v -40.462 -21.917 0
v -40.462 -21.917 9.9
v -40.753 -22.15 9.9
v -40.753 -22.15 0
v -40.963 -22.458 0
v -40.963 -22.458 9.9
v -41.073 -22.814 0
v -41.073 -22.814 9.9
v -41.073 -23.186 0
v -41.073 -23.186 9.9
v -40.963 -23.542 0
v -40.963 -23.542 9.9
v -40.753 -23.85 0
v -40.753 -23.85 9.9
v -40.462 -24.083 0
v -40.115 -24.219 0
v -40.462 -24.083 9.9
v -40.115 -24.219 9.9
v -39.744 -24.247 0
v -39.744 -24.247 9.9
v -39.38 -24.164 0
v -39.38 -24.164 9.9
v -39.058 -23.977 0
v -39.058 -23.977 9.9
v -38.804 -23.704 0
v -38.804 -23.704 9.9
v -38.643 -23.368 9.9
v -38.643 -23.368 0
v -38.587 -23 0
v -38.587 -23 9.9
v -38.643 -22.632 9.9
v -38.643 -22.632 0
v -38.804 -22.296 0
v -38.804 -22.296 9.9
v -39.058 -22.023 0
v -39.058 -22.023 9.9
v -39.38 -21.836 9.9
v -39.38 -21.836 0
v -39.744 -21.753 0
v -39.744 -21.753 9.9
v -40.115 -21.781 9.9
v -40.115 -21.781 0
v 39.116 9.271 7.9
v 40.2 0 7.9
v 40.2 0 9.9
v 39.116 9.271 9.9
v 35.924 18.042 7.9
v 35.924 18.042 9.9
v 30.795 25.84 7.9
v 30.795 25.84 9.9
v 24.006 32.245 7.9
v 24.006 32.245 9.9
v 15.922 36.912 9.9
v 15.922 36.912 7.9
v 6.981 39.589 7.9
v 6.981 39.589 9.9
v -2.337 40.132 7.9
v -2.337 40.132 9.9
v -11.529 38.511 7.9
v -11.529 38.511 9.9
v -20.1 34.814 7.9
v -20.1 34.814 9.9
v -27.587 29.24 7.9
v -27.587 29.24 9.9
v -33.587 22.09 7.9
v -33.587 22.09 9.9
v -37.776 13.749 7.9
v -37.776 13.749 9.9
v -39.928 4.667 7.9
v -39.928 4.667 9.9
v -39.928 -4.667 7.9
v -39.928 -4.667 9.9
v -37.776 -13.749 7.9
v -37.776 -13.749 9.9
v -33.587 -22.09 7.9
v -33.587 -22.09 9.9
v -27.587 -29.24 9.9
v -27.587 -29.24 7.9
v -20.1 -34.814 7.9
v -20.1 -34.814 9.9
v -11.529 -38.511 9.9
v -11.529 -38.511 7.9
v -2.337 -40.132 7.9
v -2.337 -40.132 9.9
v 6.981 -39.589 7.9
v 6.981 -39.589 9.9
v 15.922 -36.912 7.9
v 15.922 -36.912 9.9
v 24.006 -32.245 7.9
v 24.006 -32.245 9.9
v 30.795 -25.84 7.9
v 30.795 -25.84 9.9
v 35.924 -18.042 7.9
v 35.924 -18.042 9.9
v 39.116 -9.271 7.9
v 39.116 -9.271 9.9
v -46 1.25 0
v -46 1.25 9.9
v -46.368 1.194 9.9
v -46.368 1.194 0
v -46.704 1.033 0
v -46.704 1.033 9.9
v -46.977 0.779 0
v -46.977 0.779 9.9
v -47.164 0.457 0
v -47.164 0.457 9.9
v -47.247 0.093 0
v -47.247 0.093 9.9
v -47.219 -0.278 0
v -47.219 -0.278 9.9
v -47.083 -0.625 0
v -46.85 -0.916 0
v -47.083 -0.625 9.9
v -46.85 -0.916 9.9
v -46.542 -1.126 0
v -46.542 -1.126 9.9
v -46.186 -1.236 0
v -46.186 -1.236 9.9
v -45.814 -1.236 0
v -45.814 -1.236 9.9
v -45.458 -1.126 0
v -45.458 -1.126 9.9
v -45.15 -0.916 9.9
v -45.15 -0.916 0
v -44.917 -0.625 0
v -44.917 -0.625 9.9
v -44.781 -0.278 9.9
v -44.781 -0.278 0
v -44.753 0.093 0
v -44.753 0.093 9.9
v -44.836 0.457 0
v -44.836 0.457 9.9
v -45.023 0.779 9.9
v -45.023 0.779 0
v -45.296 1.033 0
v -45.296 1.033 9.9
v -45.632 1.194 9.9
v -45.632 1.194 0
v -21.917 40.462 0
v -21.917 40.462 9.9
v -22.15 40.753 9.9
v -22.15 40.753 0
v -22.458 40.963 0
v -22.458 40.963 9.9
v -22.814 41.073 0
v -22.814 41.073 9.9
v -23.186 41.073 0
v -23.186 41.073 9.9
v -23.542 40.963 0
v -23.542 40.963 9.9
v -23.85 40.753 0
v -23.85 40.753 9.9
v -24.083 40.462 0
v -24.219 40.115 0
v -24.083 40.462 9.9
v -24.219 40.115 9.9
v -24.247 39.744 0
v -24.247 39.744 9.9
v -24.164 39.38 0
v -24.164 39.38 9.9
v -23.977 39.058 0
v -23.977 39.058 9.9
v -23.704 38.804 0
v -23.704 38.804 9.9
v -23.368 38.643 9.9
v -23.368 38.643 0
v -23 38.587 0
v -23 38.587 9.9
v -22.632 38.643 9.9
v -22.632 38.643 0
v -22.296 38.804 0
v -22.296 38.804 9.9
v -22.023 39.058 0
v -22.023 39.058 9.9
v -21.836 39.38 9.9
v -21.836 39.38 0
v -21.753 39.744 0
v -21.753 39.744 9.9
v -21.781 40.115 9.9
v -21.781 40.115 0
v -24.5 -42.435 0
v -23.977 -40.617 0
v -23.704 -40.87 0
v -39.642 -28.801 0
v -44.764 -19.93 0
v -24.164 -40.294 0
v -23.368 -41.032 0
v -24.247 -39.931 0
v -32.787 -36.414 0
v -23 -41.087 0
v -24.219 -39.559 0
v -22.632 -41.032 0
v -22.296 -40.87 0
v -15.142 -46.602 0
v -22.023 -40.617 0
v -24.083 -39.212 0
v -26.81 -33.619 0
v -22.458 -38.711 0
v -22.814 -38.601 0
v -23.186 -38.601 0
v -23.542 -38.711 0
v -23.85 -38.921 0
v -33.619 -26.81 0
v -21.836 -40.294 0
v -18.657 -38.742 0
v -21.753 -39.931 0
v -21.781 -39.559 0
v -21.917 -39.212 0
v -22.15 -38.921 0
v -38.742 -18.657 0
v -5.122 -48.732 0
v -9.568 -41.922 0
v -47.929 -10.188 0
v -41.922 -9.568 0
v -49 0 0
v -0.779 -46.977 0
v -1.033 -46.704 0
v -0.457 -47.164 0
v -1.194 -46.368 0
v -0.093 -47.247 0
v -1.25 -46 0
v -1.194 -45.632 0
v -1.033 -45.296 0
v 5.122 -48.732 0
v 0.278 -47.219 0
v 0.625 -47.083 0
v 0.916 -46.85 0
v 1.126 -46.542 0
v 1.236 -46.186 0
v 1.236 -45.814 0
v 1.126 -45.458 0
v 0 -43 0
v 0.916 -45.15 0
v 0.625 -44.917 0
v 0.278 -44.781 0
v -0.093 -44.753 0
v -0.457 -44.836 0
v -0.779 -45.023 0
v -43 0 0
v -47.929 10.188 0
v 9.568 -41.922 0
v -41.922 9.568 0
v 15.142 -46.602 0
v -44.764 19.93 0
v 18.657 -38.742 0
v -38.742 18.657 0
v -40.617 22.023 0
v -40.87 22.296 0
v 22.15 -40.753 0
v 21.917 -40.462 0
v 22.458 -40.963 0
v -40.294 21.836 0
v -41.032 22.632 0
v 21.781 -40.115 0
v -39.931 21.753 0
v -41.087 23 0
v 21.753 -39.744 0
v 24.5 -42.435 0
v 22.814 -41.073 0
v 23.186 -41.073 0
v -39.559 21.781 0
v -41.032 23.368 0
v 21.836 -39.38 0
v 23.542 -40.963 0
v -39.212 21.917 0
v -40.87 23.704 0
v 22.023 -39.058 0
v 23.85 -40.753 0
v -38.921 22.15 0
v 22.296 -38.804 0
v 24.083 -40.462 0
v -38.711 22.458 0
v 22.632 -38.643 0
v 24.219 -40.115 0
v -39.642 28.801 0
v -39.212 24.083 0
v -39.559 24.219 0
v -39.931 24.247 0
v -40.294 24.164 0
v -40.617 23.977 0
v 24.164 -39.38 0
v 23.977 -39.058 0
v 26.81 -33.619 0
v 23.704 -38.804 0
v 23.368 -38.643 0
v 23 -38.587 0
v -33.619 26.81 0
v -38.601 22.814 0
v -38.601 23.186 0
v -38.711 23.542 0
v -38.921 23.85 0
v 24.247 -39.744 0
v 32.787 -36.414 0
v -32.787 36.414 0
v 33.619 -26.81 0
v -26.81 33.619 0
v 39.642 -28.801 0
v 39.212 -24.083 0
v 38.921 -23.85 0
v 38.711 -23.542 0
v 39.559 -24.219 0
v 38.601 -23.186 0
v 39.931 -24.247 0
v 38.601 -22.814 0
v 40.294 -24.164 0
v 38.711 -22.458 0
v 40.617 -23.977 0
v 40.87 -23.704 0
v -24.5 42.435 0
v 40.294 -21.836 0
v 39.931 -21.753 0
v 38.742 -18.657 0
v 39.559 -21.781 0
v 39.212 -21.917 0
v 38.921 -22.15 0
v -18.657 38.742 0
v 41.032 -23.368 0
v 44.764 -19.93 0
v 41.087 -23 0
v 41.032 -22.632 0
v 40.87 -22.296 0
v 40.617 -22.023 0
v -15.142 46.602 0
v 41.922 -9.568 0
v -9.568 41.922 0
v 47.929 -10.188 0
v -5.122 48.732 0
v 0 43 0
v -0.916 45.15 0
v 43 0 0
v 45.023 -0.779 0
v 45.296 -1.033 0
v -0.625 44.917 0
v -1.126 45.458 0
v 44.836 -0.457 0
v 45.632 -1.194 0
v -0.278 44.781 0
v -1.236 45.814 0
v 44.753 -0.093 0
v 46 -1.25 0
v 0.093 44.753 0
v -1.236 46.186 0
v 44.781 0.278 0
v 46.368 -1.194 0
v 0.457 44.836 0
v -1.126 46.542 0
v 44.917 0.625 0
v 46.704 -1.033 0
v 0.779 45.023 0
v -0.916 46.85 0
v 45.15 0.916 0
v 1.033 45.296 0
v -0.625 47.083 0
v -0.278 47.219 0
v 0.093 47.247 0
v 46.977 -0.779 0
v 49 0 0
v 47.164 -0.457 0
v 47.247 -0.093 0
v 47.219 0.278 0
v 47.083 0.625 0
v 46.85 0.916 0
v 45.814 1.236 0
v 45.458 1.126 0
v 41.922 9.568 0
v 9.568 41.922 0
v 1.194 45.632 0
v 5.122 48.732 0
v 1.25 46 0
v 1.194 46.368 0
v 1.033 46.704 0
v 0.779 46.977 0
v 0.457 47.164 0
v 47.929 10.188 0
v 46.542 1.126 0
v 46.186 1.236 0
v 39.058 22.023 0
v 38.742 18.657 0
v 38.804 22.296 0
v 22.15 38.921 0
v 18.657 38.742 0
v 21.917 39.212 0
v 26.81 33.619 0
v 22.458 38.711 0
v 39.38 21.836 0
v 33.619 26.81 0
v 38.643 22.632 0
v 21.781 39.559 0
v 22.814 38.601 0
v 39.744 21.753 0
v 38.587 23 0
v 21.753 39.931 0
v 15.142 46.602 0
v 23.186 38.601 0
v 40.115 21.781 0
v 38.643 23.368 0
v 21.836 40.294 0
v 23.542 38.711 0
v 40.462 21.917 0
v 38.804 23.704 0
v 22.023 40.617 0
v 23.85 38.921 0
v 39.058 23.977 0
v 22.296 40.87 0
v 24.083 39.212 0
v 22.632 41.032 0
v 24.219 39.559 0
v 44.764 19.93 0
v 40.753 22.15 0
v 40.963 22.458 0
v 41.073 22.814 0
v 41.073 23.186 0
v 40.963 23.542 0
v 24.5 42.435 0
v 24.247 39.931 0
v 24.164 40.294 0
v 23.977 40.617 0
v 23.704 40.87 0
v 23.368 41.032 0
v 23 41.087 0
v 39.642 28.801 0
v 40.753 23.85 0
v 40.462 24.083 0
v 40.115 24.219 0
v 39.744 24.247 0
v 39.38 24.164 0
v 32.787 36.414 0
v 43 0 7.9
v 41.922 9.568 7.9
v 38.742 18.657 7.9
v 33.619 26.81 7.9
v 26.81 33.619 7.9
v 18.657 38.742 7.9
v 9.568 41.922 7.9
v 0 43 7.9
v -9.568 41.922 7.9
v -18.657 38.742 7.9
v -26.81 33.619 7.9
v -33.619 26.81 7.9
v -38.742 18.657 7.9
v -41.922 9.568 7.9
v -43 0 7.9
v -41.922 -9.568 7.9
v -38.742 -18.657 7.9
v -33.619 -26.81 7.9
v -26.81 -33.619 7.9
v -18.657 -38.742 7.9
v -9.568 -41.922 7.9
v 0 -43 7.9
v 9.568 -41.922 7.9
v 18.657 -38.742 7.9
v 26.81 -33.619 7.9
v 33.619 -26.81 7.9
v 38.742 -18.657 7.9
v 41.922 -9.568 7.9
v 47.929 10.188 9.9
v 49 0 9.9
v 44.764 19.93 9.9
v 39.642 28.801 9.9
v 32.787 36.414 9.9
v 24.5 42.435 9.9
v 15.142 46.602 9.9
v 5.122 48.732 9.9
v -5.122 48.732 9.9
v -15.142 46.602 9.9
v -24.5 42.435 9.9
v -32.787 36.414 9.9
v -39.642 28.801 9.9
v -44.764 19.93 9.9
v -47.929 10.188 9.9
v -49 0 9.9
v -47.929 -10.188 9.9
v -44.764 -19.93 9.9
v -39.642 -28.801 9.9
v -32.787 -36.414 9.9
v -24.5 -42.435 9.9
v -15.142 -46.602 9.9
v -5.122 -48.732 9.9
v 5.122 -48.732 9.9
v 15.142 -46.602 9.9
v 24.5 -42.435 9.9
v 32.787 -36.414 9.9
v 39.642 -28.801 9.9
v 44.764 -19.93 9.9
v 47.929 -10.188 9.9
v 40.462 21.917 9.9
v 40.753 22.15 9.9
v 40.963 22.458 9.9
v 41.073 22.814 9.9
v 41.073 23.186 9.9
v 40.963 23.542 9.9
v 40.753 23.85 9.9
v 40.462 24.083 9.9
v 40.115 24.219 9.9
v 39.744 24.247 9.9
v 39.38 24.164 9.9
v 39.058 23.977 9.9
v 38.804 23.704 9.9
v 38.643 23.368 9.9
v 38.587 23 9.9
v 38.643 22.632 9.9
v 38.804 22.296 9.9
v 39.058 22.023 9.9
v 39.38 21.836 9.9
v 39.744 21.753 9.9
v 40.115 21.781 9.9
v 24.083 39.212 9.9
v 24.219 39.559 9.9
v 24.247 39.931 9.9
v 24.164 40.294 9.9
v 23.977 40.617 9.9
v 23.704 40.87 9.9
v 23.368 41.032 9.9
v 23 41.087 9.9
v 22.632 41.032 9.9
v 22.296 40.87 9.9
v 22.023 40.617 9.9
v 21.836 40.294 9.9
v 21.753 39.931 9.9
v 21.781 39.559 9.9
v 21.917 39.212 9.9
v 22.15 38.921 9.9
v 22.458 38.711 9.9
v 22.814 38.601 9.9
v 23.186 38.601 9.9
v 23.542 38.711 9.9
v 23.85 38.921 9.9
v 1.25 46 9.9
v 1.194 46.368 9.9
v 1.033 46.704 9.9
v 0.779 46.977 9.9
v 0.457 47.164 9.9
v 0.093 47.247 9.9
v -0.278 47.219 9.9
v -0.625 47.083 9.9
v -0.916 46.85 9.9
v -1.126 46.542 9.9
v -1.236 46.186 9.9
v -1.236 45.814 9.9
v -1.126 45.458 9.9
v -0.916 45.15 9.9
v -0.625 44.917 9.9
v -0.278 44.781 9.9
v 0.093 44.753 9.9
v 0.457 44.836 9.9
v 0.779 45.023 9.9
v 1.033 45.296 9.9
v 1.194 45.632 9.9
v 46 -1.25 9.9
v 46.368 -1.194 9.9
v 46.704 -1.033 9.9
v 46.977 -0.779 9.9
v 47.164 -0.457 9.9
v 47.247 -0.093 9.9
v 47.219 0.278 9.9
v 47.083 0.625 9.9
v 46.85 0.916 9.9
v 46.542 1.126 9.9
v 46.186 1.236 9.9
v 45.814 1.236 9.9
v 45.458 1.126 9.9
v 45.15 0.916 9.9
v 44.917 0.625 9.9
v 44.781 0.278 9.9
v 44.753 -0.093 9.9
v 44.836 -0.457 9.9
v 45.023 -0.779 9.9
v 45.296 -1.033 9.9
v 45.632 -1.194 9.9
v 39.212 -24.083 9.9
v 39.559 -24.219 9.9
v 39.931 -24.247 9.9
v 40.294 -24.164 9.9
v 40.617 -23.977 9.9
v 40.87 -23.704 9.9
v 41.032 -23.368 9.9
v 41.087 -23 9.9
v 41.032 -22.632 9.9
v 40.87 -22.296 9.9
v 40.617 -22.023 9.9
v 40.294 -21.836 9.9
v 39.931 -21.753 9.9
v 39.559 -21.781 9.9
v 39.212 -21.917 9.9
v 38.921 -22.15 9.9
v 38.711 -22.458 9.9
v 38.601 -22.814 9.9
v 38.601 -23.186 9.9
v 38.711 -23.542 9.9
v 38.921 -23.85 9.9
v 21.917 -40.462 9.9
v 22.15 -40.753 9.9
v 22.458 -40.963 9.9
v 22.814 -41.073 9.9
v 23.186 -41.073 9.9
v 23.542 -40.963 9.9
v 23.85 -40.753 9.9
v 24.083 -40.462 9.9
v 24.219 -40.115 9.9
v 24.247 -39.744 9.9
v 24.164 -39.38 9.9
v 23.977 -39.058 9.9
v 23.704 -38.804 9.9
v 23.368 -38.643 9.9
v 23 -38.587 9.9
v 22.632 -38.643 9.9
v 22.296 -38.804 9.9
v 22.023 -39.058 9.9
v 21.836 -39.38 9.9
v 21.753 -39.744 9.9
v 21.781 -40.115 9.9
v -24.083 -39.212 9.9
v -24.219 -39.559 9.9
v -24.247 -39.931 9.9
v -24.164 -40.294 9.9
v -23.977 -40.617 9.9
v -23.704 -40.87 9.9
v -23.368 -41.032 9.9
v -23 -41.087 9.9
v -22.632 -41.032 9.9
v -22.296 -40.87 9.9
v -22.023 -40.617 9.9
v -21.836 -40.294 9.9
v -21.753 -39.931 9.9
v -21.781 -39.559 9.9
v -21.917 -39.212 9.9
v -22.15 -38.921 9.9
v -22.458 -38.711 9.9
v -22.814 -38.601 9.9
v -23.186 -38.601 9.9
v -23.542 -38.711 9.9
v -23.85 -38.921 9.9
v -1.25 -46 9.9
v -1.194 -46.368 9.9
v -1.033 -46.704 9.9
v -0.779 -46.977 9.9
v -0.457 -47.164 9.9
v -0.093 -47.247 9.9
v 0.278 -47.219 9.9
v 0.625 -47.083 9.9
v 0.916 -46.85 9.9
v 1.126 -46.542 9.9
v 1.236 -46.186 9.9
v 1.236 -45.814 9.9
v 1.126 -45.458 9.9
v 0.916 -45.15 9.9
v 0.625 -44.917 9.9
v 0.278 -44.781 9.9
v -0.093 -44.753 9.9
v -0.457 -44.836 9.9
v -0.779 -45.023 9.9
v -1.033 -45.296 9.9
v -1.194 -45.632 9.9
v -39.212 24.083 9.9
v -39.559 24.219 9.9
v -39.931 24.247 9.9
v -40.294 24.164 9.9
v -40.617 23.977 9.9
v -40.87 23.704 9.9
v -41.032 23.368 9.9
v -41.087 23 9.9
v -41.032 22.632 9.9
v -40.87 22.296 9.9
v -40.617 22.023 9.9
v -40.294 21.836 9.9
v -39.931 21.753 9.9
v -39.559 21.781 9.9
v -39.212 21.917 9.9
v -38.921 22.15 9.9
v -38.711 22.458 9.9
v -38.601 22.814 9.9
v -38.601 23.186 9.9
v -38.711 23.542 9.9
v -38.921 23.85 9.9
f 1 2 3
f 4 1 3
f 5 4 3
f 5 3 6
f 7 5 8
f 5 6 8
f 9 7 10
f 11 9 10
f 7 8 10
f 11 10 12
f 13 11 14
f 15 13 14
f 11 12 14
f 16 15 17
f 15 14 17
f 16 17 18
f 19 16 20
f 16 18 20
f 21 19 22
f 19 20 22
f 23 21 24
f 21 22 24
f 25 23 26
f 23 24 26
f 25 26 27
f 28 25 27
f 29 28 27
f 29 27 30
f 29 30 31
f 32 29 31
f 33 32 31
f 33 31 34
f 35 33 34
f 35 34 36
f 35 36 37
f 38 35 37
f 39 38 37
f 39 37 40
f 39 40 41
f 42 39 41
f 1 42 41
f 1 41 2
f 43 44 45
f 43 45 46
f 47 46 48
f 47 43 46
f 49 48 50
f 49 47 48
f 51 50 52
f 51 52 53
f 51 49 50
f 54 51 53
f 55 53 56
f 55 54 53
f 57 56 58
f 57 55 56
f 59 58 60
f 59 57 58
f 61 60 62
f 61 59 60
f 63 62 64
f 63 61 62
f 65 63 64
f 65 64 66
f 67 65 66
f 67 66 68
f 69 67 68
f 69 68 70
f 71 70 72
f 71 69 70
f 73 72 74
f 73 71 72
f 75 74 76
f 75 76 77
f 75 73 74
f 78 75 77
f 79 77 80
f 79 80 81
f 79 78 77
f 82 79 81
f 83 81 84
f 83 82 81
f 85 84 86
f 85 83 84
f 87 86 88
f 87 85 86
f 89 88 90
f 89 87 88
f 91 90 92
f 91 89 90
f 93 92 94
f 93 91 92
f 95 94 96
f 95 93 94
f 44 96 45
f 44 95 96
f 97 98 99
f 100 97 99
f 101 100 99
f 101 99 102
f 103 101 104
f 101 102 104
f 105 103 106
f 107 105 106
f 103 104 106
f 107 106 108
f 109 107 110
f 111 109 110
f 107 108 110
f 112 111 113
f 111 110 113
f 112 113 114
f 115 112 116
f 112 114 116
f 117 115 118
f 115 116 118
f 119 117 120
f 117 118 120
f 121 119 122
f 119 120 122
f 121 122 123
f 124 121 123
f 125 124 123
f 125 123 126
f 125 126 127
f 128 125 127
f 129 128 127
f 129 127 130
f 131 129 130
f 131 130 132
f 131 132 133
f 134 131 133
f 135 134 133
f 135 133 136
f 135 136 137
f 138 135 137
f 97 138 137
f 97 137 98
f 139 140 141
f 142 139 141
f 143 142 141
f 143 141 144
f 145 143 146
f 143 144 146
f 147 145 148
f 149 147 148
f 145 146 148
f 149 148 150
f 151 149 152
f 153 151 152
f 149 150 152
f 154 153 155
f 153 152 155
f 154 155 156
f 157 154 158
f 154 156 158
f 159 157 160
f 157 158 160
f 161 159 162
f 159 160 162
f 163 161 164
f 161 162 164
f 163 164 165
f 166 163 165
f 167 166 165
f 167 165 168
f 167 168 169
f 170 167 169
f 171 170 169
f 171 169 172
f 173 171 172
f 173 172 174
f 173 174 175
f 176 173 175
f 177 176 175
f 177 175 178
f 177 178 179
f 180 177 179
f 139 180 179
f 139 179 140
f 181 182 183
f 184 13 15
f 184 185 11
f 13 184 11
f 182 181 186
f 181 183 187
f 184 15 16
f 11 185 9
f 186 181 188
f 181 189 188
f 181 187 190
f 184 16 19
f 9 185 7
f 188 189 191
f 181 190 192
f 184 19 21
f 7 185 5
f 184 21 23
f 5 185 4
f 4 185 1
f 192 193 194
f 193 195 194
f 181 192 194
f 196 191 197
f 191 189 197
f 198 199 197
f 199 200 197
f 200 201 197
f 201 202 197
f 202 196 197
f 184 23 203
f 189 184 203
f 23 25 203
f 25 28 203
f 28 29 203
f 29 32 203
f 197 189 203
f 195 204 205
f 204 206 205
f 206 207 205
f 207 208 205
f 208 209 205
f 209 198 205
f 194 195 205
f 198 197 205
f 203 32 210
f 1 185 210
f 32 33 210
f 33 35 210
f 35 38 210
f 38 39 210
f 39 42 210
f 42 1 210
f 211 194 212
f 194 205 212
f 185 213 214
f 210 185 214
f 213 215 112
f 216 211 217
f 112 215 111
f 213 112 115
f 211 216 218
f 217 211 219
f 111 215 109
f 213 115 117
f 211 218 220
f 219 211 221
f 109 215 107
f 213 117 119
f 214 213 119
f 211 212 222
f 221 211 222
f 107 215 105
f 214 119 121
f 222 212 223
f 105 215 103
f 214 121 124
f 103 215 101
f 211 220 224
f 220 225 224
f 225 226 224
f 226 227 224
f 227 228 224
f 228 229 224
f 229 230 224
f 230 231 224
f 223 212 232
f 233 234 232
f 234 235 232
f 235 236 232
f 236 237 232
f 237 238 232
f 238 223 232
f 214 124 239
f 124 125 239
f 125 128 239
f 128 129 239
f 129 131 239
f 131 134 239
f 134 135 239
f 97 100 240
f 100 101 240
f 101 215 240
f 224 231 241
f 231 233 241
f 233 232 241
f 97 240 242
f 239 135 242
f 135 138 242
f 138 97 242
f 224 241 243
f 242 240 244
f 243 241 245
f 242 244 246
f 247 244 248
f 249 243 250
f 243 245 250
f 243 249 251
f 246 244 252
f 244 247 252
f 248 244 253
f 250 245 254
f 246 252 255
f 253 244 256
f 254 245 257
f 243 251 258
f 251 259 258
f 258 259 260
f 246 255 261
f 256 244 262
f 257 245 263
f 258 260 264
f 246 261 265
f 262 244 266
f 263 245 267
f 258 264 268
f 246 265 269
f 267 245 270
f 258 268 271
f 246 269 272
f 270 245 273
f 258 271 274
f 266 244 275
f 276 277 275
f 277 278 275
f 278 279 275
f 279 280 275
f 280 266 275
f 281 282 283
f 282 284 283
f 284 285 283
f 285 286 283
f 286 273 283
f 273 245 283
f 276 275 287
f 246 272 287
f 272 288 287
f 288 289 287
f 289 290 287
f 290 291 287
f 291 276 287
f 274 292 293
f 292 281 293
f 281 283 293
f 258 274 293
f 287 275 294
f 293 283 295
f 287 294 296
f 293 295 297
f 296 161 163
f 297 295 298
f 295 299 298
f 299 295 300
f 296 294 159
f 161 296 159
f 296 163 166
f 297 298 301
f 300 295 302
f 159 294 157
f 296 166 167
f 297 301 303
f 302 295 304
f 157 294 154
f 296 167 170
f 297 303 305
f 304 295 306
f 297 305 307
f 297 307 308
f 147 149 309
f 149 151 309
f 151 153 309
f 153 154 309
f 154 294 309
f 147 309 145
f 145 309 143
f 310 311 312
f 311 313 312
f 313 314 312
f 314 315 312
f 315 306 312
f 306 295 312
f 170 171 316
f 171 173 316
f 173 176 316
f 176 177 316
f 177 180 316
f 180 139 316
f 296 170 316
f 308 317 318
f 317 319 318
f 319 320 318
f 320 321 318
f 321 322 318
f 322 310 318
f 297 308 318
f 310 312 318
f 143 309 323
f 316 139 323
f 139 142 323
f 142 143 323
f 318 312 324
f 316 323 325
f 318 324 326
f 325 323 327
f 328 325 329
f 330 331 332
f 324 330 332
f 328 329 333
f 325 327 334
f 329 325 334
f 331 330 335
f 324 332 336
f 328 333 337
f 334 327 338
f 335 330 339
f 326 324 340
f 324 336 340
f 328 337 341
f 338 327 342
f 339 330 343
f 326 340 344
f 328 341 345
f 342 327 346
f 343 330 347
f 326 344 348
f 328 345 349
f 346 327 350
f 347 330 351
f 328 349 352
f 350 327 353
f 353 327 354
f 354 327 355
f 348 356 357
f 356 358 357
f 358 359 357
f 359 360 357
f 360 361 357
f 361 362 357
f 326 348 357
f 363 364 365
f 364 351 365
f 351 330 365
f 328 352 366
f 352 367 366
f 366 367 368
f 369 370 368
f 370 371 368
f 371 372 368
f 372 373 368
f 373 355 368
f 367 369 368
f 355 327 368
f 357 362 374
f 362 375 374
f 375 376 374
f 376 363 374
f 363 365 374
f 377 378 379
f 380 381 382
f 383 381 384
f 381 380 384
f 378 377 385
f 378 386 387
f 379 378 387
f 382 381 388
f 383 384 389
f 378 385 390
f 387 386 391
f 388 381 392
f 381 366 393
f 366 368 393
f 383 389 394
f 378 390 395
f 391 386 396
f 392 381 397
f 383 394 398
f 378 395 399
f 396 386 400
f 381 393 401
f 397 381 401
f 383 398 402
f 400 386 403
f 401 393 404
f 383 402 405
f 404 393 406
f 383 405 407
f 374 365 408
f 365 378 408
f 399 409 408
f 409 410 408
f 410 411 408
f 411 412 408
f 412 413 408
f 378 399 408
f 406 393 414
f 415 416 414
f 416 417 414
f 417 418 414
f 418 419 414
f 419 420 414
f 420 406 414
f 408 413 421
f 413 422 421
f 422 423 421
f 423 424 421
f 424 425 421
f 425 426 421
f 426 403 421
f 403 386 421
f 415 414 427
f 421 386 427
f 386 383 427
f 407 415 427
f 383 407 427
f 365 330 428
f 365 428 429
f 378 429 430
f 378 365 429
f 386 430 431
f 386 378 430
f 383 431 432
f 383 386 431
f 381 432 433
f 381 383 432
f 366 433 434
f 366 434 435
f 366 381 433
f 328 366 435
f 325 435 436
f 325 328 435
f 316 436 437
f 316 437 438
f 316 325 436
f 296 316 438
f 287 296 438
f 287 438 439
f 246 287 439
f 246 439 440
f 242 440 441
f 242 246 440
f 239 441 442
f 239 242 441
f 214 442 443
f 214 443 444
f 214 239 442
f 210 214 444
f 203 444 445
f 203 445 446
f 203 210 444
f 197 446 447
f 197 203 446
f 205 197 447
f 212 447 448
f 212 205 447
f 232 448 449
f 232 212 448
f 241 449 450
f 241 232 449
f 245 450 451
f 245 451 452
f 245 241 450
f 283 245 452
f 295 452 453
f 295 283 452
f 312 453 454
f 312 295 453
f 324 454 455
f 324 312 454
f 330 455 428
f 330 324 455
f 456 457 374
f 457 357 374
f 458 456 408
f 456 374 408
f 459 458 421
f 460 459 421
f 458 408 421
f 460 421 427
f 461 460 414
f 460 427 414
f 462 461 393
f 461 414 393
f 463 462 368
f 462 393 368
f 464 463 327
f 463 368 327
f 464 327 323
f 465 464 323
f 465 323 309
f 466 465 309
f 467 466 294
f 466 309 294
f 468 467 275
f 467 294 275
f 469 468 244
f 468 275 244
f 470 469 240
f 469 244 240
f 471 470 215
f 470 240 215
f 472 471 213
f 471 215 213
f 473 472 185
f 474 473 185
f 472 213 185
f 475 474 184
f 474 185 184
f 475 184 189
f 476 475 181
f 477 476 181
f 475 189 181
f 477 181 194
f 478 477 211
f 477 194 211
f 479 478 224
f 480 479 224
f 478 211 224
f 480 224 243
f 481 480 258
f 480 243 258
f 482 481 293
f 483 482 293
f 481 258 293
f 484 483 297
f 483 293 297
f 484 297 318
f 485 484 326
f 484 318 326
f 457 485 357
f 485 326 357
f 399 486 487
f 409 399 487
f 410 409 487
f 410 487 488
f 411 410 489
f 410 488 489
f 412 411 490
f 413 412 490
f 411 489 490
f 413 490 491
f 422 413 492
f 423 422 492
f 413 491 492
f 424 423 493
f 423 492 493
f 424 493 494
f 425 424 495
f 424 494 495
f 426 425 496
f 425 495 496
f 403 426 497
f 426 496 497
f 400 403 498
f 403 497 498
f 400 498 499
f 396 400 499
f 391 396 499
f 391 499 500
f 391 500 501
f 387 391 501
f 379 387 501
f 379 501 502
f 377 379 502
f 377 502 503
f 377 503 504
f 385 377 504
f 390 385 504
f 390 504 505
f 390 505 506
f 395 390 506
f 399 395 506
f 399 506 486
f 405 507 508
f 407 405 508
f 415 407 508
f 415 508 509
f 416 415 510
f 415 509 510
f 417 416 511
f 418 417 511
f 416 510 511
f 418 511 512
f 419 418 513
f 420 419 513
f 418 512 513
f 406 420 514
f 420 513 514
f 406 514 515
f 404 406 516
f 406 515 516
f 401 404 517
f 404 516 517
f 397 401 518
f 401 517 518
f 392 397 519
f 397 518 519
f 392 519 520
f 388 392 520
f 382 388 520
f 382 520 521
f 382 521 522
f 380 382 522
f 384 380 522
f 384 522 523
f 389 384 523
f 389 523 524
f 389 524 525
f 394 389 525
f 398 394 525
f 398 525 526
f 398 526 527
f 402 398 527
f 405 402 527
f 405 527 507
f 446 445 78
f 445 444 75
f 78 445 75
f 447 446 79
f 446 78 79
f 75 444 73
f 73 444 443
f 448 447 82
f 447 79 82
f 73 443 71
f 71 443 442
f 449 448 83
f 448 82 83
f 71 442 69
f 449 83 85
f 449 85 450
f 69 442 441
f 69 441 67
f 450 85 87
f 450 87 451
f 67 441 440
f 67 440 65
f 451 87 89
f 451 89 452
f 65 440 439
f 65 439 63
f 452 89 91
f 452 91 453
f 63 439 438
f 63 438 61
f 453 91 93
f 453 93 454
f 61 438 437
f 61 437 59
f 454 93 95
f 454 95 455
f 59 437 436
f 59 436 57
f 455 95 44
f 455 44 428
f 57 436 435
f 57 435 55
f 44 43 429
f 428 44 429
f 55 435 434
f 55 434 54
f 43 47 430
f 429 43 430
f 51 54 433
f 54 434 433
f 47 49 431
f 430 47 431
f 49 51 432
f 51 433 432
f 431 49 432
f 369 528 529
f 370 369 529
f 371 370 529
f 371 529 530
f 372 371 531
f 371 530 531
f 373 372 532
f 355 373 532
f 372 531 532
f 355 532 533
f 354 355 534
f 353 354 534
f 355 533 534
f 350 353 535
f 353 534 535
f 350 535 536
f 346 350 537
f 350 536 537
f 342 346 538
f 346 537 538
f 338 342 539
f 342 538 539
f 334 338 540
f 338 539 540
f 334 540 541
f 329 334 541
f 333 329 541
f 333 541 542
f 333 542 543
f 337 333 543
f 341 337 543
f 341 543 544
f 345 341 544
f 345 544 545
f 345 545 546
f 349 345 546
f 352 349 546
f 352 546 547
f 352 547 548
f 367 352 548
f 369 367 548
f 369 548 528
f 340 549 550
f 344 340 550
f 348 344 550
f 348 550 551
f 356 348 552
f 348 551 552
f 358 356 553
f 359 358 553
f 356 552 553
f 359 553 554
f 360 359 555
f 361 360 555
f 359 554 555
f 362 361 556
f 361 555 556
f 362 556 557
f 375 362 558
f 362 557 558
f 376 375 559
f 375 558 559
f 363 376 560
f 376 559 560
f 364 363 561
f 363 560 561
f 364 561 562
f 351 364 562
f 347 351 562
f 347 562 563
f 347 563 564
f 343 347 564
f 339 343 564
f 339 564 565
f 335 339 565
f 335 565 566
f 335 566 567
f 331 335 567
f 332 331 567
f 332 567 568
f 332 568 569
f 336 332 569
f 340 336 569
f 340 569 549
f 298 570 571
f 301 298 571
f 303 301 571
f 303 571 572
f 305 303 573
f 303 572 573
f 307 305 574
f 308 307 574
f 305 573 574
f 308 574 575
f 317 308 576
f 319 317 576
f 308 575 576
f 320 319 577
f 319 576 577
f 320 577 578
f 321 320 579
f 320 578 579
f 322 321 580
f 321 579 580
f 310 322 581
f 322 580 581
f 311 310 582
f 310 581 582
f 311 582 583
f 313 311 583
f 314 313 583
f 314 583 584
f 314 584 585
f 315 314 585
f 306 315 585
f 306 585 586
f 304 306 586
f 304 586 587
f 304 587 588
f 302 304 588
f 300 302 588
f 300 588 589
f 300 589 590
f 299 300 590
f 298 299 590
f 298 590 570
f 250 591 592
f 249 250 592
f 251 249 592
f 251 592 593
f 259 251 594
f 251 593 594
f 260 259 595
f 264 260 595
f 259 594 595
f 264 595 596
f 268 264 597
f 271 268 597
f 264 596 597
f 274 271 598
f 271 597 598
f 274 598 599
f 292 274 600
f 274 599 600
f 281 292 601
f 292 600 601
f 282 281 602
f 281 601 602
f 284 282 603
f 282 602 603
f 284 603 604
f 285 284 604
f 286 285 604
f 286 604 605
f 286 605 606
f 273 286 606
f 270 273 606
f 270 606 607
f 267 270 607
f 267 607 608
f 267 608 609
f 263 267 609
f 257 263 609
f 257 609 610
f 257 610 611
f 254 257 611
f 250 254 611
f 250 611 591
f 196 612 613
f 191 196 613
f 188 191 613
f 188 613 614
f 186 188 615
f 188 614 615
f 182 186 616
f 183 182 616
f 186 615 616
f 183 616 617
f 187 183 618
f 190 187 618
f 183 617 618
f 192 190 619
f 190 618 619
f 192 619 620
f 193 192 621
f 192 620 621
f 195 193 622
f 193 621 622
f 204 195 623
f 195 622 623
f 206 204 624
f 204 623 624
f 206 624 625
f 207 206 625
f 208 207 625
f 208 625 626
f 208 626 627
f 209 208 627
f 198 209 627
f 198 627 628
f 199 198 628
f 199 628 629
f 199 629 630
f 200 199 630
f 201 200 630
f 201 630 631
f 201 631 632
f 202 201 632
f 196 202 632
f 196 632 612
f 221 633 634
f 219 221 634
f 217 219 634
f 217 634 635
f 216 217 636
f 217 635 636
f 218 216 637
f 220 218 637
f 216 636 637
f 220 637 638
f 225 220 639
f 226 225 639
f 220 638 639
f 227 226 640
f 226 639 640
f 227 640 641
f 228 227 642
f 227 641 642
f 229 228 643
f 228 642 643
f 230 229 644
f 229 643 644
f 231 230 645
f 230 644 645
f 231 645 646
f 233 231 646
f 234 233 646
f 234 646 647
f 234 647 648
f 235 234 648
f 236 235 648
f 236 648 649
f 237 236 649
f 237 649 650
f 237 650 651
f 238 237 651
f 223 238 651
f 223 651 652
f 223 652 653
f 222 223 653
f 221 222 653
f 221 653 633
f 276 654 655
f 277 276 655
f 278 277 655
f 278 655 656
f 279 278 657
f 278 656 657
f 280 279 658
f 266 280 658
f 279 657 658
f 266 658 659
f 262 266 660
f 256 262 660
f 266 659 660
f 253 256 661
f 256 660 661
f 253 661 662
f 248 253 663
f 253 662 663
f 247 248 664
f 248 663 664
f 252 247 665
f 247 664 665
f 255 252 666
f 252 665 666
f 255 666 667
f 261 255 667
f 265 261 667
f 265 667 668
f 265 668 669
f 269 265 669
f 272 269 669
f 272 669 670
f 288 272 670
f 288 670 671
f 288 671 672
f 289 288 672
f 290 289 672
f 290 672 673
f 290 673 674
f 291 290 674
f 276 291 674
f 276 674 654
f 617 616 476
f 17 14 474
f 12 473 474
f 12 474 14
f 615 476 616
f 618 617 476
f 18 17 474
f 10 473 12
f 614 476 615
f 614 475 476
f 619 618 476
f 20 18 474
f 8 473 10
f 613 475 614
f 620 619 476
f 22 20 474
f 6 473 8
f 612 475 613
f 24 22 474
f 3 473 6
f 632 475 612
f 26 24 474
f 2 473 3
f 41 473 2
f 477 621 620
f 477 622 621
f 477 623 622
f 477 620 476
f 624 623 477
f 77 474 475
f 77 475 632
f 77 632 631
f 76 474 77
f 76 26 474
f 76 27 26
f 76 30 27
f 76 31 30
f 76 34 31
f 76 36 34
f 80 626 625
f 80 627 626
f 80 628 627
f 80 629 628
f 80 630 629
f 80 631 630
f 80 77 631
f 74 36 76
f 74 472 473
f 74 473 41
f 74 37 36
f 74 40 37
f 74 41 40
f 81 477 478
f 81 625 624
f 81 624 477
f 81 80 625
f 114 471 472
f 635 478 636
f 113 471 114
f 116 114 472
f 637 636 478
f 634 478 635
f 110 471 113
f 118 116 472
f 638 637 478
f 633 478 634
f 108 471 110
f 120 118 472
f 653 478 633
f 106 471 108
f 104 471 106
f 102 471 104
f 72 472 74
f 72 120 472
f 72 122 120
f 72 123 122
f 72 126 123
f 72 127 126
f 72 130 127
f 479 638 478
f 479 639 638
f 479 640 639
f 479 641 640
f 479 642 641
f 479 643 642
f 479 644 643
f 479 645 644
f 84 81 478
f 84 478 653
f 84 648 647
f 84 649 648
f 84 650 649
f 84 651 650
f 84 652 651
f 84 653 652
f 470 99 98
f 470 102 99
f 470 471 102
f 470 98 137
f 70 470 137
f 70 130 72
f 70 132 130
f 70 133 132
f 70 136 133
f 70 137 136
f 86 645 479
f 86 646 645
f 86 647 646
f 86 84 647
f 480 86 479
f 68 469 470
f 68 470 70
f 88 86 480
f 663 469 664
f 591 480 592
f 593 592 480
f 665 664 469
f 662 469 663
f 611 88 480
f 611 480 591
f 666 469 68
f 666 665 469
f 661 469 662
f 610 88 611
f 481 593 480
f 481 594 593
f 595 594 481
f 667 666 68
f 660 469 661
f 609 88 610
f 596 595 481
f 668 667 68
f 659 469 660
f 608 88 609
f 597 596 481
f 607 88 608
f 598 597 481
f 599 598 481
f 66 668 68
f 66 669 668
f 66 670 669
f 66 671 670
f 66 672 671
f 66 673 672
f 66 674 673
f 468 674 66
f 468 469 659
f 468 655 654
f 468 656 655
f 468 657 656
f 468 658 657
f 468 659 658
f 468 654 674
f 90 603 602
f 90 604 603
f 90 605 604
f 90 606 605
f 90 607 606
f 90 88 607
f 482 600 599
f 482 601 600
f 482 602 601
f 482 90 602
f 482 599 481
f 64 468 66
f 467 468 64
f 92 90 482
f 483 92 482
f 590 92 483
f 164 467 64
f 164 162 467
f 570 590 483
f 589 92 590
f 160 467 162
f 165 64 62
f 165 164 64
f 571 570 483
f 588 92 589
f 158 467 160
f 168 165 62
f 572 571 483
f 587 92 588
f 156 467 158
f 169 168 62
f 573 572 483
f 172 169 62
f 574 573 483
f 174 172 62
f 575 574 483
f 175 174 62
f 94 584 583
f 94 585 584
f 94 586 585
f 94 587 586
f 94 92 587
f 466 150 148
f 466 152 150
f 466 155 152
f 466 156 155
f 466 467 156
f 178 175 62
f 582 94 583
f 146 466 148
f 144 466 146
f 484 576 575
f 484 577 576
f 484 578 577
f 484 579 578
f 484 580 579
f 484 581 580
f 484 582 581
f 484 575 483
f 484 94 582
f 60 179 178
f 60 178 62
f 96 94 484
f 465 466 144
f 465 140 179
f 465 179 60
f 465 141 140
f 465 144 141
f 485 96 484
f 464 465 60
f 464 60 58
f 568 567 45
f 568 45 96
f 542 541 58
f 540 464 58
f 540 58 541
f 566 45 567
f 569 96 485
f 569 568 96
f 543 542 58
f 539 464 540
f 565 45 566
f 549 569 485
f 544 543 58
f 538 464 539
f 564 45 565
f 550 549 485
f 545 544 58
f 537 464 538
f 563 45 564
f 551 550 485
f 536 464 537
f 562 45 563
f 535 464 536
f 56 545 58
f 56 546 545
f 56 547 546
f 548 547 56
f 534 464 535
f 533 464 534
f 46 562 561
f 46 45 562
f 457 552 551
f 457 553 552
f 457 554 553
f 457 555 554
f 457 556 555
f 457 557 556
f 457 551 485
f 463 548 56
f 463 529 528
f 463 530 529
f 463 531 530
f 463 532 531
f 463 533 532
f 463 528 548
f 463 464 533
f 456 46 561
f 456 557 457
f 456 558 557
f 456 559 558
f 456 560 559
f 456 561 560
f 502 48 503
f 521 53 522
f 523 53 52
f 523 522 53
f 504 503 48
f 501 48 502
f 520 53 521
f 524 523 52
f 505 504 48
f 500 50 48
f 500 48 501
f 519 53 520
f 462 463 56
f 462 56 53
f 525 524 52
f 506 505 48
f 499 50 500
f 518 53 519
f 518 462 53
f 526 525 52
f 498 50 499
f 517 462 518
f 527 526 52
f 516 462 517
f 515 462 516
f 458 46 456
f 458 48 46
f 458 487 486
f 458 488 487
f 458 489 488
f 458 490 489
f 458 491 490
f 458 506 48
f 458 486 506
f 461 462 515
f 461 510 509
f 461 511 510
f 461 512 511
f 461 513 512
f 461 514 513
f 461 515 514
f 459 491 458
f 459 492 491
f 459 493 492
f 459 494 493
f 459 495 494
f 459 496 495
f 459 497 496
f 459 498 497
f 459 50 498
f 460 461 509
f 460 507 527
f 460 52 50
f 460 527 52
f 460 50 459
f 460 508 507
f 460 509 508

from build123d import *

# Parameters (mm, degrees)
SKETCH_1_R               = 49
SKETCH_1_R_2             = 43
EXTRUDE_1_DEPTH          = 7.9
SKETCH_3_R               = 49
SKETCH_3_R_2             = 40.2
EXTRUDE_3_DEPTH          = 2
HOLE_WIZARD_M3_1_D       = 2.5
PATTERN_CIRCULAR_1_COUNT = 12


with BuildPart() as part:
    # 草图1 → 凸台-拉伸1 (new body)
    with BuildSketch(Plane.XY):
        Circle(SKETCH_1_R)
        Circle(SKETCH_1_R_2, mode=Mode.SUBTRACT)
    extrude(amount=EXTRUDE_1_DEPTH)

    # 草图3 → 凸台-拉伸3 (add)
    with BuildSketch(Plane.XY.offset(7.9)):
        Circle(SKETCH_3_R)
        Circle(SKETCH_3_R_2, mode=Mode.SUBTRACT)
    extrude(amount=EXTRUDE_3_DEPTH)

    # M3 螺纹孔1 (through all)
    with Locations(Plane(origin=(0, 0, 0), x_dir=(-1, 0, 0), z_dir=(0, 0, -1))):
        with Locations((0, 46)):
            hole_wizard_m3_1 = Hole(HOLE_WIZARD_M3_1_D / 2)

    # 阵列(圆周)1: M3 螺纹孔1 ×12 about axis
    pattern_circular_1_axis = Axis((0, 0, 0), (0, 0, 1))
    for i in range(1, PATTERN_CIRCULAR_1_COUNT):
        add(hole_wizard_m3_1.rotate(pattern_circular_1_axis, i * 360 / PATTERN_CIRCULAR_1_COUNT), mode=Mode.SUBTRACT)


solid = part.part
